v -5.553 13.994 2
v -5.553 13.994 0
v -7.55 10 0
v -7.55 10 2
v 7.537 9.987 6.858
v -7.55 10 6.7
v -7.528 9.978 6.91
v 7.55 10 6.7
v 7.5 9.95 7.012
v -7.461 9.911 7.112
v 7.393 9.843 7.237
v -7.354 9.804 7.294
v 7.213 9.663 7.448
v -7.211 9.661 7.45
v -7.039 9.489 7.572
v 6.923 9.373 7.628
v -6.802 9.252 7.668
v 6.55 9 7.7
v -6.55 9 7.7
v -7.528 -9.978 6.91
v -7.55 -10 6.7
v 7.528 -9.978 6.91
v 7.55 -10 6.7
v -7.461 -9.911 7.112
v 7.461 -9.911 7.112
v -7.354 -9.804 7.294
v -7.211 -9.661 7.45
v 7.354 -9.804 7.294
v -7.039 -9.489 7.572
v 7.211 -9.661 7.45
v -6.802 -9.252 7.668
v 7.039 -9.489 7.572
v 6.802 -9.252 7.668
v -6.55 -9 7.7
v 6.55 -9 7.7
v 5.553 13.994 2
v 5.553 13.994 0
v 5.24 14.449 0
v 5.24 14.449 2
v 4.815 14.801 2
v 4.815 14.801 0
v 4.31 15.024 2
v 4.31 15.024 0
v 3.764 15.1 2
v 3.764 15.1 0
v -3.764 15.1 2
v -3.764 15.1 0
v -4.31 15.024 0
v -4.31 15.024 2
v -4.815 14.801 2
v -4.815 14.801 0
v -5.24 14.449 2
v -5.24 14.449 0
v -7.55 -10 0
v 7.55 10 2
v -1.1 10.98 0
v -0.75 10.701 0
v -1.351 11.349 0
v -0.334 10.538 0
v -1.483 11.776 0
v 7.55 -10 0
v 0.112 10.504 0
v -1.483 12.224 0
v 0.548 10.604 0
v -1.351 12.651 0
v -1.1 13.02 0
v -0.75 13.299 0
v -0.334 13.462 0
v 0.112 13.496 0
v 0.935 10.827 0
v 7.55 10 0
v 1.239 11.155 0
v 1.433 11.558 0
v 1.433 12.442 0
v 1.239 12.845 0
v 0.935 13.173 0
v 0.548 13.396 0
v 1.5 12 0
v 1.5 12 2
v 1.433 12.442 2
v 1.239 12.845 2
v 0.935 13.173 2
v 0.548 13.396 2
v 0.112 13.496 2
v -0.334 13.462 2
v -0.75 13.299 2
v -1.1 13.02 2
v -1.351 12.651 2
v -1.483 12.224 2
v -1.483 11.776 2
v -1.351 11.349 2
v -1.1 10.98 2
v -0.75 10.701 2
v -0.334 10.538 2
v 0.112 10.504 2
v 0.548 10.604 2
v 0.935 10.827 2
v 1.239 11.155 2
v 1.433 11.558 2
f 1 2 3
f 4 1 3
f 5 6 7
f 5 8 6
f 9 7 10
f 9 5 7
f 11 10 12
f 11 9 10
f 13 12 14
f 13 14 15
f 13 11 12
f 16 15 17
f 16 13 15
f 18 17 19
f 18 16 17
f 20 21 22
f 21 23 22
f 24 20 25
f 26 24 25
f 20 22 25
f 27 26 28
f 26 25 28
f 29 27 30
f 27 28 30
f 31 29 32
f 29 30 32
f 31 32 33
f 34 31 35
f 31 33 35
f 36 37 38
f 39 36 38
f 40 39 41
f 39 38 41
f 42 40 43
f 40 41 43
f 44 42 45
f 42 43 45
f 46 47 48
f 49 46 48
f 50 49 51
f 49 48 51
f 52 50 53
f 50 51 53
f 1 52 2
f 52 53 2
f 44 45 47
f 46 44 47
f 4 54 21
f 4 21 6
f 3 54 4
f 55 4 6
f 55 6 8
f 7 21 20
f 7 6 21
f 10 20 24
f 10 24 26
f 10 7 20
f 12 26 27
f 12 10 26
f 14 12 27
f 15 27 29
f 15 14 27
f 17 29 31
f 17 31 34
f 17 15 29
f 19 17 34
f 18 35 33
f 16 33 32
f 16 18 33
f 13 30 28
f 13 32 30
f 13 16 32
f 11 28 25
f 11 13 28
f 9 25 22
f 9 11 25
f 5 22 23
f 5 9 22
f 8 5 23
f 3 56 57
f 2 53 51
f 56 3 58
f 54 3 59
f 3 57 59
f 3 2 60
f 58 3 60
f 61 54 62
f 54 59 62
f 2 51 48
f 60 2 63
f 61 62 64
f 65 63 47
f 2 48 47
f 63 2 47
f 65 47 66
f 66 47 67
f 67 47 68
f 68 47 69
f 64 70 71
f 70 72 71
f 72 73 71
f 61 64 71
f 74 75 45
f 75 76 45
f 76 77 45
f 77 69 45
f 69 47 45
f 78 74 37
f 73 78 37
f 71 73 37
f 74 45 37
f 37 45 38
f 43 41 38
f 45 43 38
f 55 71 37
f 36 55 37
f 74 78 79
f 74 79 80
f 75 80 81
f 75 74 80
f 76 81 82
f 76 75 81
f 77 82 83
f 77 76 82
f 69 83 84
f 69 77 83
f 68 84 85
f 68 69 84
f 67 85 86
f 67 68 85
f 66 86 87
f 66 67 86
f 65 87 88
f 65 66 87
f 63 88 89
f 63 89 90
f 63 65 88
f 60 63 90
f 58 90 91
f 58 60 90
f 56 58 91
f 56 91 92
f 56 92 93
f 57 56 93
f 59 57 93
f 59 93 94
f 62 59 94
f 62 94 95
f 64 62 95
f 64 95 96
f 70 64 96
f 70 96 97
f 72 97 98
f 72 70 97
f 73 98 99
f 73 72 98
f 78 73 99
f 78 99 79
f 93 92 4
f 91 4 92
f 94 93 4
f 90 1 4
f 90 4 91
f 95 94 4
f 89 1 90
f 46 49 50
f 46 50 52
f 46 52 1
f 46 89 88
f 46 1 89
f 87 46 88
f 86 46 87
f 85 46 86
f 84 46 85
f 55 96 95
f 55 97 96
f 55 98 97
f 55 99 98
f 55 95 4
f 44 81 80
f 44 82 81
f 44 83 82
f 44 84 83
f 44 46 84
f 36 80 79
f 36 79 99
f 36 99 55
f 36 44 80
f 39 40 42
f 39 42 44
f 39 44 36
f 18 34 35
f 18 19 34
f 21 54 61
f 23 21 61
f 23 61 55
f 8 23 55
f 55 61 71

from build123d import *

# Parameters (mm, degrees)
F0_R     = 1.5
F1_DEPTH = 2
F0_W     = 15.1
F0_H     = 20
F2_DEPTH = 7.7
F3_R     = 1


with BuildPart() as f1:
    # F0 (on Top) → F1 (new body)
    with BuildSketch(Plane.XY):
        with BuildLine():
            Line((-7.55, 10), (7.55, 10))
            Line((7.55, 10), (5.552786, 13.994427))
            ThreePointArc((5.552786, 13.994427), (4.815394, 14.801302), (3.763932, 15.1))
            Line((3.763932, 15.1), (-3.763932, 15.1))
            ThreePointArc((-3.763932, 15.1), (-4.815394, 14.801302), (-5.552786, 13.994427))
            Line((-5.552786, 13.994427), (-7.55, 10))
        make_face()
        with Locations((0, 12)):
            Circle(F0_R, mode=Mode.SUBTRACT)
    extrude(amount=F1_DEPTH)

    # F0 (on Top) → F2 (join)
    with BuildSketch(Plane.XY):
        Rectangle(F0_W, F0_H)
    extrude(amount=F2_DEPTH)

    # F3
    f3_edges = [f1.edges().sort_by_distance(p)[0] for p in [
        (0, -10, 7.7),
        (7.55, 0, 7.7),
        (0, 10, 7.7),
        (-7.55, 0, 7.7),
    ]]
    fillet(f3_edges, radius=F3_R)


solid = f1.part
